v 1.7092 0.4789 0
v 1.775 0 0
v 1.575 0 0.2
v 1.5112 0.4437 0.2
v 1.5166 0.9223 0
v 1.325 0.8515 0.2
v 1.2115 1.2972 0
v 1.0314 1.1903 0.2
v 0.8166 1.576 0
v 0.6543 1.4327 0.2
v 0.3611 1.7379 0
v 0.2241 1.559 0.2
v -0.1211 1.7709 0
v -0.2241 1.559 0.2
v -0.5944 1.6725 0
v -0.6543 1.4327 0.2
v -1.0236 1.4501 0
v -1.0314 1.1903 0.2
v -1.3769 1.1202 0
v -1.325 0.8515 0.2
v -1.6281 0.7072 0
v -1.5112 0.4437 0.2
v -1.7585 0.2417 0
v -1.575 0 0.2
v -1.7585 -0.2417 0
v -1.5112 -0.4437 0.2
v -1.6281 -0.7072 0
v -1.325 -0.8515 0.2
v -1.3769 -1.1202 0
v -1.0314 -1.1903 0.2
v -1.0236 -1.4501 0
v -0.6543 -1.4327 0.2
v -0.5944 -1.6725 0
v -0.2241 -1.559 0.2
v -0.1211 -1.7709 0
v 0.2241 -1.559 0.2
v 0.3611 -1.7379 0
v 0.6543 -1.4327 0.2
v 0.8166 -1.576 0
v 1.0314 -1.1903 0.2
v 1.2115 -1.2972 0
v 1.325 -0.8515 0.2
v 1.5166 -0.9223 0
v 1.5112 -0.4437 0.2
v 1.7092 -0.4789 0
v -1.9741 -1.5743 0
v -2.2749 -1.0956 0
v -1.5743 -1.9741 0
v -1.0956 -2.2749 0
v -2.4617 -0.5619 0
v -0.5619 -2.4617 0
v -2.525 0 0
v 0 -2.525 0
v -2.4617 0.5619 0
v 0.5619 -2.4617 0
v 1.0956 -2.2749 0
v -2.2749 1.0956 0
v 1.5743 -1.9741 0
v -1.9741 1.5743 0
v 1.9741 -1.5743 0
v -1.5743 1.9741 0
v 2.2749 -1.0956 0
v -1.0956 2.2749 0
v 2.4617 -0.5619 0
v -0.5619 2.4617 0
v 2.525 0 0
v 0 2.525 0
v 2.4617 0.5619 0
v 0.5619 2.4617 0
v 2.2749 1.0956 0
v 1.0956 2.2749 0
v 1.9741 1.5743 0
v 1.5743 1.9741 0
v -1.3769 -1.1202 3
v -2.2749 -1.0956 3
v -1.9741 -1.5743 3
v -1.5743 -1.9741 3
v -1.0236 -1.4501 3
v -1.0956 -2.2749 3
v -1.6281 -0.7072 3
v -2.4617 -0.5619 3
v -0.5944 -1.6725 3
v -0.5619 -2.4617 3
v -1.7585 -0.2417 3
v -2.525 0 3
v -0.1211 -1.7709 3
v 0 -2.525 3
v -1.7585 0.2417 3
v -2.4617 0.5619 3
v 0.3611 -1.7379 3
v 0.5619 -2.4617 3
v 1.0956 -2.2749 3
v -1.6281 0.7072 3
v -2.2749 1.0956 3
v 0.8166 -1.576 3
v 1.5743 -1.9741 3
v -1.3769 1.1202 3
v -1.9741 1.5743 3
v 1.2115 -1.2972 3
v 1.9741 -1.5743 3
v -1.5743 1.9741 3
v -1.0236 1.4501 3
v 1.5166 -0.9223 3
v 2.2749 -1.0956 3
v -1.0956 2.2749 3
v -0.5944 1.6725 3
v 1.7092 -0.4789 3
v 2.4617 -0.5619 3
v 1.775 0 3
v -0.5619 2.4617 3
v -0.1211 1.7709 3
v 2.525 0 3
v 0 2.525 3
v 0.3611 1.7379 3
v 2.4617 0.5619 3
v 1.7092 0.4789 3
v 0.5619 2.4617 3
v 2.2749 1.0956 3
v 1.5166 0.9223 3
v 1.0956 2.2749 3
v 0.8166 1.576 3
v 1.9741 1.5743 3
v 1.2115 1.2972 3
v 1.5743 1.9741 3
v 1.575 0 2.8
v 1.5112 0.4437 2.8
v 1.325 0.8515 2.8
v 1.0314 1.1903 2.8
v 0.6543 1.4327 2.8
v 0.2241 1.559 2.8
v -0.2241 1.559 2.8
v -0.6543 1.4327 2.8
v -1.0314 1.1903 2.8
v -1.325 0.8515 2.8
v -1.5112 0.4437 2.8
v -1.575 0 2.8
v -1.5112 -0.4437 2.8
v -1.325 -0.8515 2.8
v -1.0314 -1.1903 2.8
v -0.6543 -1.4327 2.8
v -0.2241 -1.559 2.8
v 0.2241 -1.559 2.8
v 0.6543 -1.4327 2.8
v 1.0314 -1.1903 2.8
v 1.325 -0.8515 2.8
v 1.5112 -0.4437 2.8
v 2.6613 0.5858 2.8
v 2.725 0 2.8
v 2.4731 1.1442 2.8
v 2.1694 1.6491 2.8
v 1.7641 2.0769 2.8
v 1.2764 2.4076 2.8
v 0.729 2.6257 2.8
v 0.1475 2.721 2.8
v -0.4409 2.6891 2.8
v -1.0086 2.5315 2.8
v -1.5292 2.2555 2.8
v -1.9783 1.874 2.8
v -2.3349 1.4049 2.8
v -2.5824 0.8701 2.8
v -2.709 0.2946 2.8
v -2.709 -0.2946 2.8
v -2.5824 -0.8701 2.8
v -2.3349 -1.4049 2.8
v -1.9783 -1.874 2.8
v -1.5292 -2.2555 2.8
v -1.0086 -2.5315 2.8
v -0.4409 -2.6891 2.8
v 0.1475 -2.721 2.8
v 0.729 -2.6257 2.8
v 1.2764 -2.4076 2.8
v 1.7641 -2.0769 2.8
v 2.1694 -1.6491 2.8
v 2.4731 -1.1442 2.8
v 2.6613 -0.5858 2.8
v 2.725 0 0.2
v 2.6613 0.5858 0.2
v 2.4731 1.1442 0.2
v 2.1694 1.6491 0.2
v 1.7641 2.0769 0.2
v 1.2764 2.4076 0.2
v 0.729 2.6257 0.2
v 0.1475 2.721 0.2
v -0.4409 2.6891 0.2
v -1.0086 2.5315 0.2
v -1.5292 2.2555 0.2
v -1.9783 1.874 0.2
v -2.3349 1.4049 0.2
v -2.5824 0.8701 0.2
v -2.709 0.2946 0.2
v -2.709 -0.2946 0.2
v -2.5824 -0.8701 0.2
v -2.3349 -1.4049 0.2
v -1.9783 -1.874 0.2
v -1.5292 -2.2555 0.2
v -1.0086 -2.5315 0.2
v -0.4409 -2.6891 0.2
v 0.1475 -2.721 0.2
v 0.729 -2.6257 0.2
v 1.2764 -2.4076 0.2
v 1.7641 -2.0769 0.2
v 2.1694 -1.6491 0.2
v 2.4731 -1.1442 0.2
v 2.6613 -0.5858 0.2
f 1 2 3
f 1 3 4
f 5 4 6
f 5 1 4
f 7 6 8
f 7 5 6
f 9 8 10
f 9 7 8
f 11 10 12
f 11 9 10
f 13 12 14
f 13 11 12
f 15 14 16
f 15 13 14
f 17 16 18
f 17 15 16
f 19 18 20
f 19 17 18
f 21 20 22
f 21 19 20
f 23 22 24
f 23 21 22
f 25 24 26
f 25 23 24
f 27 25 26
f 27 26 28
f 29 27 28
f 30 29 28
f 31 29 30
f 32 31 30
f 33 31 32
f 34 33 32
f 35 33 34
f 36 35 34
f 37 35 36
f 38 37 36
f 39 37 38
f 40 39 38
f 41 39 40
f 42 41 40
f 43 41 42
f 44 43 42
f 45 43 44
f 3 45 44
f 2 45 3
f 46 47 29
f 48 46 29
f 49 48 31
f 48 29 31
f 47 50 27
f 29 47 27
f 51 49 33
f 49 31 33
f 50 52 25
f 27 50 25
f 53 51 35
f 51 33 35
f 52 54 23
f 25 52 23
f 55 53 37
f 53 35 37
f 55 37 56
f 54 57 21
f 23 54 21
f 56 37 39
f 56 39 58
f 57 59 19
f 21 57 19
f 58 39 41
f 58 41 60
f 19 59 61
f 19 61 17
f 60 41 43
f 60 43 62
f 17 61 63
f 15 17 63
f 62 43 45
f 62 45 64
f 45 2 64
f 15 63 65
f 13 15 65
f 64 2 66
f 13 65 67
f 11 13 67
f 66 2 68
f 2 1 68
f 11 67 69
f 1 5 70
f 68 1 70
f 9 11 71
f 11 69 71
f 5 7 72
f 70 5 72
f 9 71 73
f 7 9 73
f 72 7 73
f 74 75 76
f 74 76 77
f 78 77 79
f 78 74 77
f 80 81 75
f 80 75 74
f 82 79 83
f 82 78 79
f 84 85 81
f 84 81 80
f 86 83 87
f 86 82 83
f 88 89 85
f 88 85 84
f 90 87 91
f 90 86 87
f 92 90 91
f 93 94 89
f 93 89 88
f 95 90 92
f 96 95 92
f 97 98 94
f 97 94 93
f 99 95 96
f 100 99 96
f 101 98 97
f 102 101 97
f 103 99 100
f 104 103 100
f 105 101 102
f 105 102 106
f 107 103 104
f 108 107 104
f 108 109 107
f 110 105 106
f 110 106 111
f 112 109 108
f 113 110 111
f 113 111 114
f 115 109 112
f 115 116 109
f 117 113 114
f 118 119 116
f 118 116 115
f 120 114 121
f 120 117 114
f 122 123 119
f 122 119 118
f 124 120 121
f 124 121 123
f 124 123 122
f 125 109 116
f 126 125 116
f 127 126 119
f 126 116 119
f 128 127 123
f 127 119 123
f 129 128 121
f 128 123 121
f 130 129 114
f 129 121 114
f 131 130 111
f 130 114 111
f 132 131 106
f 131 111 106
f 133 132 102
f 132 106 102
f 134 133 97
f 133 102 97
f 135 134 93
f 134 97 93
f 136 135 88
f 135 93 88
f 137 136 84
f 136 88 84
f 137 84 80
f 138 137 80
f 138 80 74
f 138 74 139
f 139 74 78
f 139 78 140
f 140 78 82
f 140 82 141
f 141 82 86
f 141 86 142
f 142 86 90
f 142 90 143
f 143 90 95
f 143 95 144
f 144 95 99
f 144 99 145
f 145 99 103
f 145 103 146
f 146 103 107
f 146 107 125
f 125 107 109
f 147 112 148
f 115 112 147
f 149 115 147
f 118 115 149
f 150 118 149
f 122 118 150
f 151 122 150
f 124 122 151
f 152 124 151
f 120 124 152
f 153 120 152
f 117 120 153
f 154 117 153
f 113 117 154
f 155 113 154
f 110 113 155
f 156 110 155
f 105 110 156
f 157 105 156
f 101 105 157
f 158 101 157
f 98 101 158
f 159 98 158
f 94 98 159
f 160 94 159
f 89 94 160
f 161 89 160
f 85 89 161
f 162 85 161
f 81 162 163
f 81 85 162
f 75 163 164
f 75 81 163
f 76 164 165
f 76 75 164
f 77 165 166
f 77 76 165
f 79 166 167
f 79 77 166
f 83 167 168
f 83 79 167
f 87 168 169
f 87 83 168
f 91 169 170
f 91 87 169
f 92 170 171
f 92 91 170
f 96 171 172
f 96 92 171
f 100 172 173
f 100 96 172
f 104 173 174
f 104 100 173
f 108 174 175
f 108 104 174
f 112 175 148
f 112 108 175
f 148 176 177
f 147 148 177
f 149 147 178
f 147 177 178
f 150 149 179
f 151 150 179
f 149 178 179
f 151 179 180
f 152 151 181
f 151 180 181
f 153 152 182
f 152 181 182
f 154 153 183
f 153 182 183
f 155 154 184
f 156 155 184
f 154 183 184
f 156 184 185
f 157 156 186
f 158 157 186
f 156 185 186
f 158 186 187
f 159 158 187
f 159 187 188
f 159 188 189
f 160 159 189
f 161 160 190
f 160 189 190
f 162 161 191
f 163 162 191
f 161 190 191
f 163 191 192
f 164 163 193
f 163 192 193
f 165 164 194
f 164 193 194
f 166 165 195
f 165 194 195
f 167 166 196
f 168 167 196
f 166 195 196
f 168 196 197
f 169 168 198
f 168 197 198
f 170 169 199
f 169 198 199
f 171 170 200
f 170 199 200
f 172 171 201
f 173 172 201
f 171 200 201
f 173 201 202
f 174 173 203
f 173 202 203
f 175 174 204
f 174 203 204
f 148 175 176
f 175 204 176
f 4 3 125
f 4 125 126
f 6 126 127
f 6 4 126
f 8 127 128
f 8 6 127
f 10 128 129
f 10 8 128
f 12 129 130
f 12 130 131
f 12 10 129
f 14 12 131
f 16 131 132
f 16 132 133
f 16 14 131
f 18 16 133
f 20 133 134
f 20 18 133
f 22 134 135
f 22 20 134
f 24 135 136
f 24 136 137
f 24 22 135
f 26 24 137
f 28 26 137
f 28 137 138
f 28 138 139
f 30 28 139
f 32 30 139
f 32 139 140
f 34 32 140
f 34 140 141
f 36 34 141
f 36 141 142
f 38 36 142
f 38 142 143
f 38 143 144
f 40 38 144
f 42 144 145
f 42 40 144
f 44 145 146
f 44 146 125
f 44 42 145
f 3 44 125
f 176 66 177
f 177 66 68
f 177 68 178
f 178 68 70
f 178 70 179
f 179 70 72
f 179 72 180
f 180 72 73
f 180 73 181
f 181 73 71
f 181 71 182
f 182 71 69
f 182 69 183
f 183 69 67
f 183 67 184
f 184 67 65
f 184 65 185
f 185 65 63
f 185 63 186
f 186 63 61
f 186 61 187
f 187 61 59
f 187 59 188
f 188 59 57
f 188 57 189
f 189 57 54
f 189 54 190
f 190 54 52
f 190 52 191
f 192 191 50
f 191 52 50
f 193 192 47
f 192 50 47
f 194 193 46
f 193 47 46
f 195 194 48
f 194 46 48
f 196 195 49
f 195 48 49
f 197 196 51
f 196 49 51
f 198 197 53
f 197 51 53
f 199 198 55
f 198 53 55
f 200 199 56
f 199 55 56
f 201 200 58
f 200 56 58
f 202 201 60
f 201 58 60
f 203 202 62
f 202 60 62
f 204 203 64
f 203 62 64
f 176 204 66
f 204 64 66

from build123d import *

# Parameters (mm, degrees)
SKETCH1_R           = 2.725
SKETCH1_R_2         = 1.575
BOSS_EXTRUDE1_DEPTH = 3
DEBURS_SIZE         = 0.2


with BuildPart() as part:
    # Sketch1 → Boss-Extrude1 (new body)
    with BuildSketch(Plane.XY):
        Circle(SKETCH1_R)
        Circle(SKETCH1_R_2, mode=Mode.SUBTRACT)
    extrude(amount=BOSS_EXTRUDE1_DEPTH)

    # Deburs
    deburs_edges = [part.edges().sort_by_distance(p)[0] for p in [
        (-2.725, 0, 0),
        (-2.725, 0, 3),
        (-1.575, 0, 0),
        (-1.575, 0, 3),
    ]]
    chamfer(deburs_edges, length=DEBURS_SIZE)


solid = part.part
